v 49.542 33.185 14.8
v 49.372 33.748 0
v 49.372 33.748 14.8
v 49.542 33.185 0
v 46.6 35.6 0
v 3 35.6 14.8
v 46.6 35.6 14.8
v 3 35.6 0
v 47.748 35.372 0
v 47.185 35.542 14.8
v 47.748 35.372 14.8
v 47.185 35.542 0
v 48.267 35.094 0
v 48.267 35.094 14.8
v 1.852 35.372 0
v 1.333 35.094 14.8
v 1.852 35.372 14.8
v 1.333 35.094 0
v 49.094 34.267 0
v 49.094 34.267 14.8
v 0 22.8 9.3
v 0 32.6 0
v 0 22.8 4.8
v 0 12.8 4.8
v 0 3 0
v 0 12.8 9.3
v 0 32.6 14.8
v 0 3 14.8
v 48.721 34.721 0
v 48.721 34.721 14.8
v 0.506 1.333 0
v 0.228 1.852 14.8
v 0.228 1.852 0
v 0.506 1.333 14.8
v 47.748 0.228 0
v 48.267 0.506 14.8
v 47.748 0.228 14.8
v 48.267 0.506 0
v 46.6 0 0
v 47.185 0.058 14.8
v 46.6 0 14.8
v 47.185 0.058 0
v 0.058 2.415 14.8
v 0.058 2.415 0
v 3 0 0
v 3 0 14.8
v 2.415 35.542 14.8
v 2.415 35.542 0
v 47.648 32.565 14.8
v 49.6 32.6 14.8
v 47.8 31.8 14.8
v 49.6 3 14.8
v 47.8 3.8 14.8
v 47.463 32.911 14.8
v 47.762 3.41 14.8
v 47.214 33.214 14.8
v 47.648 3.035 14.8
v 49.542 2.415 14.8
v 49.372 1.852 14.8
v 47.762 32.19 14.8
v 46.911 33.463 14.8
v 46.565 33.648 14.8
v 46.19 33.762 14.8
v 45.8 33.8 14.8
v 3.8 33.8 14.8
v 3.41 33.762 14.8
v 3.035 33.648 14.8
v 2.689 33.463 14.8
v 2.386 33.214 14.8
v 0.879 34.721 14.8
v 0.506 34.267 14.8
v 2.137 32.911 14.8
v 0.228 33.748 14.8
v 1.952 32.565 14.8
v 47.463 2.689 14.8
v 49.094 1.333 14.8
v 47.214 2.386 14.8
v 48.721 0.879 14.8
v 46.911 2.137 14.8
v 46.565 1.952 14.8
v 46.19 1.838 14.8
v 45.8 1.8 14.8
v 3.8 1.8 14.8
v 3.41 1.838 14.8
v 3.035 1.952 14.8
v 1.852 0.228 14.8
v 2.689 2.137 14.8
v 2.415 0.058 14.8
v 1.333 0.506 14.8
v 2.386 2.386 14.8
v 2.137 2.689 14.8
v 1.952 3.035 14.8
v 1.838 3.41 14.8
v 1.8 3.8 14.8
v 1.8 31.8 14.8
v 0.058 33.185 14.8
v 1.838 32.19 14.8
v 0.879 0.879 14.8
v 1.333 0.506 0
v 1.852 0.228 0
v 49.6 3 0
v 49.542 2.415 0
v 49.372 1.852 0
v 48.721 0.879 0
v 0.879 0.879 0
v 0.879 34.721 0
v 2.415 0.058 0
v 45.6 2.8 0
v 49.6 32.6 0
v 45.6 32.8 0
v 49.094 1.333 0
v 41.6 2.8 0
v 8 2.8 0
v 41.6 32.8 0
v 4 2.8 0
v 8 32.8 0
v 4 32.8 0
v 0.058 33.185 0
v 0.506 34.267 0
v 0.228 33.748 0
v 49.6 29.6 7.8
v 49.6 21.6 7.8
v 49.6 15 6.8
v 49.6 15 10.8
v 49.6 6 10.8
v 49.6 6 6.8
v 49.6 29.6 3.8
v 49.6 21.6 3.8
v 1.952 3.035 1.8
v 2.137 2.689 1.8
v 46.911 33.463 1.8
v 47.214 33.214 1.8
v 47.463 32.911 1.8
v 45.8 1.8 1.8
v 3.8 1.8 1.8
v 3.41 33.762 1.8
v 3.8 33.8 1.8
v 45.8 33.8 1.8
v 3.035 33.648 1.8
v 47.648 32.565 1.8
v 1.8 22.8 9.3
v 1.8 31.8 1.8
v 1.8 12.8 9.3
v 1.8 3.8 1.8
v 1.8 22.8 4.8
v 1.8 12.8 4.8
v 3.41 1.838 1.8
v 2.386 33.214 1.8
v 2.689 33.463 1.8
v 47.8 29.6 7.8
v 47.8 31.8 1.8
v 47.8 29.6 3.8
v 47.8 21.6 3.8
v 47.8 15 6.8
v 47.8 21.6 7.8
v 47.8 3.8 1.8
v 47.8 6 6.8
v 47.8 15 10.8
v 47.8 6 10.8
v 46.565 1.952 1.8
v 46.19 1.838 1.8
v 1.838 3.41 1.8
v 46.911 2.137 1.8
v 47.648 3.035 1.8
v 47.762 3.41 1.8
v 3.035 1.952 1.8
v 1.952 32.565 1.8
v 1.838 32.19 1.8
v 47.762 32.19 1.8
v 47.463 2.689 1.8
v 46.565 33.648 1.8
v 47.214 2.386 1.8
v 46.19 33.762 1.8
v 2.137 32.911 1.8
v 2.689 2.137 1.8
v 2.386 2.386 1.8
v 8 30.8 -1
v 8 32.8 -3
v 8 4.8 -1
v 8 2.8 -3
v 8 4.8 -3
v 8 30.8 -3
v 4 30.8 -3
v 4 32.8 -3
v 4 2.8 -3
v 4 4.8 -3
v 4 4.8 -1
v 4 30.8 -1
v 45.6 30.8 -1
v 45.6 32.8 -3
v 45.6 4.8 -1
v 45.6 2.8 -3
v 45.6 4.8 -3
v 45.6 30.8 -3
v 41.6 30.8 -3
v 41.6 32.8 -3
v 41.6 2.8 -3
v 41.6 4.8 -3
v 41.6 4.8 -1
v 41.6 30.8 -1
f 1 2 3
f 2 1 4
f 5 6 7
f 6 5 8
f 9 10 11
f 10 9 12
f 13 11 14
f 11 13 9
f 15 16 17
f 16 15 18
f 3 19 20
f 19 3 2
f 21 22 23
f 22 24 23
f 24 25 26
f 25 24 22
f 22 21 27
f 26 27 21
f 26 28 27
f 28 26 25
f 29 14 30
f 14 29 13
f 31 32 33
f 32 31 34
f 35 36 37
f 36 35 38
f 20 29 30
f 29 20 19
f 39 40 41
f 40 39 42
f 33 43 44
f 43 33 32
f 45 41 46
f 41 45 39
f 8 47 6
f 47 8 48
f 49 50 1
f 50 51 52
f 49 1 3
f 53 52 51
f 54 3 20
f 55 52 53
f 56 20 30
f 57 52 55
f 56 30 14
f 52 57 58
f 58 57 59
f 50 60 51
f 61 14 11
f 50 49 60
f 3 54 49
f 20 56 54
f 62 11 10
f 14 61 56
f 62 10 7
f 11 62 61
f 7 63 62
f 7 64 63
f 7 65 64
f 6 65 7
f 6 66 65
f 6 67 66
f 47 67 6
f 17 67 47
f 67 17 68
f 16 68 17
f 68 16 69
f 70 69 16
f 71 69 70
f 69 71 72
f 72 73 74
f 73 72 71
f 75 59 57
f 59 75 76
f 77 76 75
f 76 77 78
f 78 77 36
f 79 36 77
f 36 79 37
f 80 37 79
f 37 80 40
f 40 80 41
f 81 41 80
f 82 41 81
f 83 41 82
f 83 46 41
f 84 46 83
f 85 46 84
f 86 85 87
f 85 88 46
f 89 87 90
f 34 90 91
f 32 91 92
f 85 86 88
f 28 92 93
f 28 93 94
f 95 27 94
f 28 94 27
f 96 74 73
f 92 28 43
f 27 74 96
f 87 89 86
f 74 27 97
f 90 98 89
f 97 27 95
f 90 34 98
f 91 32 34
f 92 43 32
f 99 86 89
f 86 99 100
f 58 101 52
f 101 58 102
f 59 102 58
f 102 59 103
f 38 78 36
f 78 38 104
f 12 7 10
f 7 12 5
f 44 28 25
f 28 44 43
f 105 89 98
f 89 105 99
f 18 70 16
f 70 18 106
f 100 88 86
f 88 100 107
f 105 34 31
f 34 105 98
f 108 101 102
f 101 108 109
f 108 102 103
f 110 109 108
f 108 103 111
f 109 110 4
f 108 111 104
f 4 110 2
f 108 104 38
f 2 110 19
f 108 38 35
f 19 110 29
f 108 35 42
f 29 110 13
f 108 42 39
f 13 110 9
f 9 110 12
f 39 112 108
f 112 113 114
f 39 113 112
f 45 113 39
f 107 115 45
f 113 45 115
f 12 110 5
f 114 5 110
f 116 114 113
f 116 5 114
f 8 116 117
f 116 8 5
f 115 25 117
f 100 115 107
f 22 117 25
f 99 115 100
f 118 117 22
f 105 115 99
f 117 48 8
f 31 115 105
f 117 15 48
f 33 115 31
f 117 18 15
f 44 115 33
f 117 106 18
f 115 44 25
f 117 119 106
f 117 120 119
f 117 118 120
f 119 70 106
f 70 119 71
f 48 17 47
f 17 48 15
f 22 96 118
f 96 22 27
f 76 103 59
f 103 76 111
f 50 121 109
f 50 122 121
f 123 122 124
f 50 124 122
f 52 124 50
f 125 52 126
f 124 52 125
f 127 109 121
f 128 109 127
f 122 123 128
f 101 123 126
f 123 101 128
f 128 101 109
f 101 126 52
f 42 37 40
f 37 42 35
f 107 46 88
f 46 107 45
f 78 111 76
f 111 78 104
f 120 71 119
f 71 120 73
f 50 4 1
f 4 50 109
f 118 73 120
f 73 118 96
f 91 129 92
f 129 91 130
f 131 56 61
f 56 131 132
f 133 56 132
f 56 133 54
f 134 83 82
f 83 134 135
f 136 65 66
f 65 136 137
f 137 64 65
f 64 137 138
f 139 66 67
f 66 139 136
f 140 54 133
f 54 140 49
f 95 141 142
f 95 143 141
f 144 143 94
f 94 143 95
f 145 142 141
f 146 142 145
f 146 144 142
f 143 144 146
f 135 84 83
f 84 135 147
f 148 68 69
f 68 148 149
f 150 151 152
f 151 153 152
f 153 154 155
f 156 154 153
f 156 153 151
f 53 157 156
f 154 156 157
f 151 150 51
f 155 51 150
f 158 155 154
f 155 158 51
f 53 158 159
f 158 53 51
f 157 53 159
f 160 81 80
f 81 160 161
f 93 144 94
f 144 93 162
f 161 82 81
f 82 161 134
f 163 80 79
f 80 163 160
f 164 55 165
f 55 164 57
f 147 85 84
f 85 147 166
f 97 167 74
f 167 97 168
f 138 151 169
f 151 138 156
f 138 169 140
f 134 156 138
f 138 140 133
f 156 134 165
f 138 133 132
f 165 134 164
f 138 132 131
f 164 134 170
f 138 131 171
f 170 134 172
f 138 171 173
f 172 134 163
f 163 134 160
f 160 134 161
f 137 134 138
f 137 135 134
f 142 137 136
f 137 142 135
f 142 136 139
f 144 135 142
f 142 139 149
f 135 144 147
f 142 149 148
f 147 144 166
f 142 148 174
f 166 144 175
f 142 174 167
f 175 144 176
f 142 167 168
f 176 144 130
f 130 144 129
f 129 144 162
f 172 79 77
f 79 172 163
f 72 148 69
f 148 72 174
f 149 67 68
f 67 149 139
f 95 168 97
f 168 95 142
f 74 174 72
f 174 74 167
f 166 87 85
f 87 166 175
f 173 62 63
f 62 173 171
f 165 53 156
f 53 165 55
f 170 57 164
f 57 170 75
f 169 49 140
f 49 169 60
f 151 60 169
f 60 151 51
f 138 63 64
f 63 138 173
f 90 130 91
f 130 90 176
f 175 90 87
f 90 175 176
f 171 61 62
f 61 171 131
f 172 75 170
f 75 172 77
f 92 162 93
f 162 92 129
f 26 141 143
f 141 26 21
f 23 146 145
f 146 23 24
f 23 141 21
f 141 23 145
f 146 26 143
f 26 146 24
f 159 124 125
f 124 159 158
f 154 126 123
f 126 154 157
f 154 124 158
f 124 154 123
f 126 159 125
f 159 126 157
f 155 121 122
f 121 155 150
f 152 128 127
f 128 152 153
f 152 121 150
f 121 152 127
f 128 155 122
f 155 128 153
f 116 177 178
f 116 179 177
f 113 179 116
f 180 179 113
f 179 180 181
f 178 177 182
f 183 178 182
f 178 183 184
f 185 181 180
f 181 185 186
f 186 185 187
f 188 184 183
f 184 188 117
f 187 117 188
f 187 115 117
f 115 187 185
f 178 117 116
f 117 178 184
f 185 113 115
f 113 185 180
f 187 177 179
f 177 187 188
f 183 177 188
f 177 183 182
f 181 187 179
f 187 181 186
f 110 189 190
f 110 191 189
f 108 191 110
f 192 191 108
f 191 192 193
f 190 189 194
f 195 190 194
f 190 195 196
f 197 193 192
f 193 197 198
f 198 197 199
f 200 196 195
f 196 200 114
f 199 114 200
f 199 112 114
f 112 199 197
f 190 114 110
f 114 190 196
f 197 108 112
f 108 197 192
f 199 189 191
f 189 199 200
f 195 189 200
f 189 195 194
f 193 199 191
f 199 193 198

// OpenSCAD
// GestureTalk Glove — electronics pod (OpenSCAD). Print in PETG, 0.2 mm, no supports.
// Two parts: base (print as-is) and lid (set PART = "lid").
PART = "base";            // "base" | "lid"
inner = [46, 32, 13];     // fits a 3x4 cm perfboard + XIAO + 500 mAh Li-Po underneath
wall = 1.8;
r = 3;                    // corner radius
strap_w = 26;             // Velcro strap width

module rbox(s, rad) {
  hull() for (x = [rad, s[0]-rad], y = [rad, s[1]-rad]) translate([x, y, 0]) cylinder(r=rad, h=s[2], $fn=32);
}

module base() {
  outer = [inner[0]+2*wall, inner[1]+2*wall, inner[2]+wall];
  difference() {
    rbox(outer, r);
    translate([wall, wall, wall]) rbox([inner[0], inner[1], inner[2]+1], r-1);
    // USB-C (XIAO at the short end)
    translate([-1, outer[1]/2-5, wall+3]) cube([wall+2, 10, 4.5]);
    // slide switch
    translate([outer[0]-wall-1, 6, wall+5]) cube([wall+2, 9, 4]);
    // sensor cable exit (toward the fingers)
    translate([outer[0]-wall-1, outer[1]-14, wall+2]) cube([wall+2, 8, 4]);
  }
  // strap loops on the bottom
  for (x = [4, outer[0]-8]) translate([x, (outer[1]-strap_w)/2-2, -3]) difference() {
    cube([4, strap_w+4, 3]);
    translate([-1, 2, -1]) cube([6, strap_w, 3]);
  }
}

module lid() {
  outer = [inner[0]+2*wall, inner[1]+2*wall, wall];
  difference() {
    union() {
      rbox(outer, r);
      translate([wall+0.2, wall+0.2, wall]) rbox([inner[0]-0.4, inner[1]-0.4, 2], r-1); // friction lip
    }
    // calibrate button hole
    translate([outer[0]/2, outer[1]/2, -1]) cylinder(d=4, h=10, $fn=24);
  }
}

if (PART == "base") base(); else lid();
